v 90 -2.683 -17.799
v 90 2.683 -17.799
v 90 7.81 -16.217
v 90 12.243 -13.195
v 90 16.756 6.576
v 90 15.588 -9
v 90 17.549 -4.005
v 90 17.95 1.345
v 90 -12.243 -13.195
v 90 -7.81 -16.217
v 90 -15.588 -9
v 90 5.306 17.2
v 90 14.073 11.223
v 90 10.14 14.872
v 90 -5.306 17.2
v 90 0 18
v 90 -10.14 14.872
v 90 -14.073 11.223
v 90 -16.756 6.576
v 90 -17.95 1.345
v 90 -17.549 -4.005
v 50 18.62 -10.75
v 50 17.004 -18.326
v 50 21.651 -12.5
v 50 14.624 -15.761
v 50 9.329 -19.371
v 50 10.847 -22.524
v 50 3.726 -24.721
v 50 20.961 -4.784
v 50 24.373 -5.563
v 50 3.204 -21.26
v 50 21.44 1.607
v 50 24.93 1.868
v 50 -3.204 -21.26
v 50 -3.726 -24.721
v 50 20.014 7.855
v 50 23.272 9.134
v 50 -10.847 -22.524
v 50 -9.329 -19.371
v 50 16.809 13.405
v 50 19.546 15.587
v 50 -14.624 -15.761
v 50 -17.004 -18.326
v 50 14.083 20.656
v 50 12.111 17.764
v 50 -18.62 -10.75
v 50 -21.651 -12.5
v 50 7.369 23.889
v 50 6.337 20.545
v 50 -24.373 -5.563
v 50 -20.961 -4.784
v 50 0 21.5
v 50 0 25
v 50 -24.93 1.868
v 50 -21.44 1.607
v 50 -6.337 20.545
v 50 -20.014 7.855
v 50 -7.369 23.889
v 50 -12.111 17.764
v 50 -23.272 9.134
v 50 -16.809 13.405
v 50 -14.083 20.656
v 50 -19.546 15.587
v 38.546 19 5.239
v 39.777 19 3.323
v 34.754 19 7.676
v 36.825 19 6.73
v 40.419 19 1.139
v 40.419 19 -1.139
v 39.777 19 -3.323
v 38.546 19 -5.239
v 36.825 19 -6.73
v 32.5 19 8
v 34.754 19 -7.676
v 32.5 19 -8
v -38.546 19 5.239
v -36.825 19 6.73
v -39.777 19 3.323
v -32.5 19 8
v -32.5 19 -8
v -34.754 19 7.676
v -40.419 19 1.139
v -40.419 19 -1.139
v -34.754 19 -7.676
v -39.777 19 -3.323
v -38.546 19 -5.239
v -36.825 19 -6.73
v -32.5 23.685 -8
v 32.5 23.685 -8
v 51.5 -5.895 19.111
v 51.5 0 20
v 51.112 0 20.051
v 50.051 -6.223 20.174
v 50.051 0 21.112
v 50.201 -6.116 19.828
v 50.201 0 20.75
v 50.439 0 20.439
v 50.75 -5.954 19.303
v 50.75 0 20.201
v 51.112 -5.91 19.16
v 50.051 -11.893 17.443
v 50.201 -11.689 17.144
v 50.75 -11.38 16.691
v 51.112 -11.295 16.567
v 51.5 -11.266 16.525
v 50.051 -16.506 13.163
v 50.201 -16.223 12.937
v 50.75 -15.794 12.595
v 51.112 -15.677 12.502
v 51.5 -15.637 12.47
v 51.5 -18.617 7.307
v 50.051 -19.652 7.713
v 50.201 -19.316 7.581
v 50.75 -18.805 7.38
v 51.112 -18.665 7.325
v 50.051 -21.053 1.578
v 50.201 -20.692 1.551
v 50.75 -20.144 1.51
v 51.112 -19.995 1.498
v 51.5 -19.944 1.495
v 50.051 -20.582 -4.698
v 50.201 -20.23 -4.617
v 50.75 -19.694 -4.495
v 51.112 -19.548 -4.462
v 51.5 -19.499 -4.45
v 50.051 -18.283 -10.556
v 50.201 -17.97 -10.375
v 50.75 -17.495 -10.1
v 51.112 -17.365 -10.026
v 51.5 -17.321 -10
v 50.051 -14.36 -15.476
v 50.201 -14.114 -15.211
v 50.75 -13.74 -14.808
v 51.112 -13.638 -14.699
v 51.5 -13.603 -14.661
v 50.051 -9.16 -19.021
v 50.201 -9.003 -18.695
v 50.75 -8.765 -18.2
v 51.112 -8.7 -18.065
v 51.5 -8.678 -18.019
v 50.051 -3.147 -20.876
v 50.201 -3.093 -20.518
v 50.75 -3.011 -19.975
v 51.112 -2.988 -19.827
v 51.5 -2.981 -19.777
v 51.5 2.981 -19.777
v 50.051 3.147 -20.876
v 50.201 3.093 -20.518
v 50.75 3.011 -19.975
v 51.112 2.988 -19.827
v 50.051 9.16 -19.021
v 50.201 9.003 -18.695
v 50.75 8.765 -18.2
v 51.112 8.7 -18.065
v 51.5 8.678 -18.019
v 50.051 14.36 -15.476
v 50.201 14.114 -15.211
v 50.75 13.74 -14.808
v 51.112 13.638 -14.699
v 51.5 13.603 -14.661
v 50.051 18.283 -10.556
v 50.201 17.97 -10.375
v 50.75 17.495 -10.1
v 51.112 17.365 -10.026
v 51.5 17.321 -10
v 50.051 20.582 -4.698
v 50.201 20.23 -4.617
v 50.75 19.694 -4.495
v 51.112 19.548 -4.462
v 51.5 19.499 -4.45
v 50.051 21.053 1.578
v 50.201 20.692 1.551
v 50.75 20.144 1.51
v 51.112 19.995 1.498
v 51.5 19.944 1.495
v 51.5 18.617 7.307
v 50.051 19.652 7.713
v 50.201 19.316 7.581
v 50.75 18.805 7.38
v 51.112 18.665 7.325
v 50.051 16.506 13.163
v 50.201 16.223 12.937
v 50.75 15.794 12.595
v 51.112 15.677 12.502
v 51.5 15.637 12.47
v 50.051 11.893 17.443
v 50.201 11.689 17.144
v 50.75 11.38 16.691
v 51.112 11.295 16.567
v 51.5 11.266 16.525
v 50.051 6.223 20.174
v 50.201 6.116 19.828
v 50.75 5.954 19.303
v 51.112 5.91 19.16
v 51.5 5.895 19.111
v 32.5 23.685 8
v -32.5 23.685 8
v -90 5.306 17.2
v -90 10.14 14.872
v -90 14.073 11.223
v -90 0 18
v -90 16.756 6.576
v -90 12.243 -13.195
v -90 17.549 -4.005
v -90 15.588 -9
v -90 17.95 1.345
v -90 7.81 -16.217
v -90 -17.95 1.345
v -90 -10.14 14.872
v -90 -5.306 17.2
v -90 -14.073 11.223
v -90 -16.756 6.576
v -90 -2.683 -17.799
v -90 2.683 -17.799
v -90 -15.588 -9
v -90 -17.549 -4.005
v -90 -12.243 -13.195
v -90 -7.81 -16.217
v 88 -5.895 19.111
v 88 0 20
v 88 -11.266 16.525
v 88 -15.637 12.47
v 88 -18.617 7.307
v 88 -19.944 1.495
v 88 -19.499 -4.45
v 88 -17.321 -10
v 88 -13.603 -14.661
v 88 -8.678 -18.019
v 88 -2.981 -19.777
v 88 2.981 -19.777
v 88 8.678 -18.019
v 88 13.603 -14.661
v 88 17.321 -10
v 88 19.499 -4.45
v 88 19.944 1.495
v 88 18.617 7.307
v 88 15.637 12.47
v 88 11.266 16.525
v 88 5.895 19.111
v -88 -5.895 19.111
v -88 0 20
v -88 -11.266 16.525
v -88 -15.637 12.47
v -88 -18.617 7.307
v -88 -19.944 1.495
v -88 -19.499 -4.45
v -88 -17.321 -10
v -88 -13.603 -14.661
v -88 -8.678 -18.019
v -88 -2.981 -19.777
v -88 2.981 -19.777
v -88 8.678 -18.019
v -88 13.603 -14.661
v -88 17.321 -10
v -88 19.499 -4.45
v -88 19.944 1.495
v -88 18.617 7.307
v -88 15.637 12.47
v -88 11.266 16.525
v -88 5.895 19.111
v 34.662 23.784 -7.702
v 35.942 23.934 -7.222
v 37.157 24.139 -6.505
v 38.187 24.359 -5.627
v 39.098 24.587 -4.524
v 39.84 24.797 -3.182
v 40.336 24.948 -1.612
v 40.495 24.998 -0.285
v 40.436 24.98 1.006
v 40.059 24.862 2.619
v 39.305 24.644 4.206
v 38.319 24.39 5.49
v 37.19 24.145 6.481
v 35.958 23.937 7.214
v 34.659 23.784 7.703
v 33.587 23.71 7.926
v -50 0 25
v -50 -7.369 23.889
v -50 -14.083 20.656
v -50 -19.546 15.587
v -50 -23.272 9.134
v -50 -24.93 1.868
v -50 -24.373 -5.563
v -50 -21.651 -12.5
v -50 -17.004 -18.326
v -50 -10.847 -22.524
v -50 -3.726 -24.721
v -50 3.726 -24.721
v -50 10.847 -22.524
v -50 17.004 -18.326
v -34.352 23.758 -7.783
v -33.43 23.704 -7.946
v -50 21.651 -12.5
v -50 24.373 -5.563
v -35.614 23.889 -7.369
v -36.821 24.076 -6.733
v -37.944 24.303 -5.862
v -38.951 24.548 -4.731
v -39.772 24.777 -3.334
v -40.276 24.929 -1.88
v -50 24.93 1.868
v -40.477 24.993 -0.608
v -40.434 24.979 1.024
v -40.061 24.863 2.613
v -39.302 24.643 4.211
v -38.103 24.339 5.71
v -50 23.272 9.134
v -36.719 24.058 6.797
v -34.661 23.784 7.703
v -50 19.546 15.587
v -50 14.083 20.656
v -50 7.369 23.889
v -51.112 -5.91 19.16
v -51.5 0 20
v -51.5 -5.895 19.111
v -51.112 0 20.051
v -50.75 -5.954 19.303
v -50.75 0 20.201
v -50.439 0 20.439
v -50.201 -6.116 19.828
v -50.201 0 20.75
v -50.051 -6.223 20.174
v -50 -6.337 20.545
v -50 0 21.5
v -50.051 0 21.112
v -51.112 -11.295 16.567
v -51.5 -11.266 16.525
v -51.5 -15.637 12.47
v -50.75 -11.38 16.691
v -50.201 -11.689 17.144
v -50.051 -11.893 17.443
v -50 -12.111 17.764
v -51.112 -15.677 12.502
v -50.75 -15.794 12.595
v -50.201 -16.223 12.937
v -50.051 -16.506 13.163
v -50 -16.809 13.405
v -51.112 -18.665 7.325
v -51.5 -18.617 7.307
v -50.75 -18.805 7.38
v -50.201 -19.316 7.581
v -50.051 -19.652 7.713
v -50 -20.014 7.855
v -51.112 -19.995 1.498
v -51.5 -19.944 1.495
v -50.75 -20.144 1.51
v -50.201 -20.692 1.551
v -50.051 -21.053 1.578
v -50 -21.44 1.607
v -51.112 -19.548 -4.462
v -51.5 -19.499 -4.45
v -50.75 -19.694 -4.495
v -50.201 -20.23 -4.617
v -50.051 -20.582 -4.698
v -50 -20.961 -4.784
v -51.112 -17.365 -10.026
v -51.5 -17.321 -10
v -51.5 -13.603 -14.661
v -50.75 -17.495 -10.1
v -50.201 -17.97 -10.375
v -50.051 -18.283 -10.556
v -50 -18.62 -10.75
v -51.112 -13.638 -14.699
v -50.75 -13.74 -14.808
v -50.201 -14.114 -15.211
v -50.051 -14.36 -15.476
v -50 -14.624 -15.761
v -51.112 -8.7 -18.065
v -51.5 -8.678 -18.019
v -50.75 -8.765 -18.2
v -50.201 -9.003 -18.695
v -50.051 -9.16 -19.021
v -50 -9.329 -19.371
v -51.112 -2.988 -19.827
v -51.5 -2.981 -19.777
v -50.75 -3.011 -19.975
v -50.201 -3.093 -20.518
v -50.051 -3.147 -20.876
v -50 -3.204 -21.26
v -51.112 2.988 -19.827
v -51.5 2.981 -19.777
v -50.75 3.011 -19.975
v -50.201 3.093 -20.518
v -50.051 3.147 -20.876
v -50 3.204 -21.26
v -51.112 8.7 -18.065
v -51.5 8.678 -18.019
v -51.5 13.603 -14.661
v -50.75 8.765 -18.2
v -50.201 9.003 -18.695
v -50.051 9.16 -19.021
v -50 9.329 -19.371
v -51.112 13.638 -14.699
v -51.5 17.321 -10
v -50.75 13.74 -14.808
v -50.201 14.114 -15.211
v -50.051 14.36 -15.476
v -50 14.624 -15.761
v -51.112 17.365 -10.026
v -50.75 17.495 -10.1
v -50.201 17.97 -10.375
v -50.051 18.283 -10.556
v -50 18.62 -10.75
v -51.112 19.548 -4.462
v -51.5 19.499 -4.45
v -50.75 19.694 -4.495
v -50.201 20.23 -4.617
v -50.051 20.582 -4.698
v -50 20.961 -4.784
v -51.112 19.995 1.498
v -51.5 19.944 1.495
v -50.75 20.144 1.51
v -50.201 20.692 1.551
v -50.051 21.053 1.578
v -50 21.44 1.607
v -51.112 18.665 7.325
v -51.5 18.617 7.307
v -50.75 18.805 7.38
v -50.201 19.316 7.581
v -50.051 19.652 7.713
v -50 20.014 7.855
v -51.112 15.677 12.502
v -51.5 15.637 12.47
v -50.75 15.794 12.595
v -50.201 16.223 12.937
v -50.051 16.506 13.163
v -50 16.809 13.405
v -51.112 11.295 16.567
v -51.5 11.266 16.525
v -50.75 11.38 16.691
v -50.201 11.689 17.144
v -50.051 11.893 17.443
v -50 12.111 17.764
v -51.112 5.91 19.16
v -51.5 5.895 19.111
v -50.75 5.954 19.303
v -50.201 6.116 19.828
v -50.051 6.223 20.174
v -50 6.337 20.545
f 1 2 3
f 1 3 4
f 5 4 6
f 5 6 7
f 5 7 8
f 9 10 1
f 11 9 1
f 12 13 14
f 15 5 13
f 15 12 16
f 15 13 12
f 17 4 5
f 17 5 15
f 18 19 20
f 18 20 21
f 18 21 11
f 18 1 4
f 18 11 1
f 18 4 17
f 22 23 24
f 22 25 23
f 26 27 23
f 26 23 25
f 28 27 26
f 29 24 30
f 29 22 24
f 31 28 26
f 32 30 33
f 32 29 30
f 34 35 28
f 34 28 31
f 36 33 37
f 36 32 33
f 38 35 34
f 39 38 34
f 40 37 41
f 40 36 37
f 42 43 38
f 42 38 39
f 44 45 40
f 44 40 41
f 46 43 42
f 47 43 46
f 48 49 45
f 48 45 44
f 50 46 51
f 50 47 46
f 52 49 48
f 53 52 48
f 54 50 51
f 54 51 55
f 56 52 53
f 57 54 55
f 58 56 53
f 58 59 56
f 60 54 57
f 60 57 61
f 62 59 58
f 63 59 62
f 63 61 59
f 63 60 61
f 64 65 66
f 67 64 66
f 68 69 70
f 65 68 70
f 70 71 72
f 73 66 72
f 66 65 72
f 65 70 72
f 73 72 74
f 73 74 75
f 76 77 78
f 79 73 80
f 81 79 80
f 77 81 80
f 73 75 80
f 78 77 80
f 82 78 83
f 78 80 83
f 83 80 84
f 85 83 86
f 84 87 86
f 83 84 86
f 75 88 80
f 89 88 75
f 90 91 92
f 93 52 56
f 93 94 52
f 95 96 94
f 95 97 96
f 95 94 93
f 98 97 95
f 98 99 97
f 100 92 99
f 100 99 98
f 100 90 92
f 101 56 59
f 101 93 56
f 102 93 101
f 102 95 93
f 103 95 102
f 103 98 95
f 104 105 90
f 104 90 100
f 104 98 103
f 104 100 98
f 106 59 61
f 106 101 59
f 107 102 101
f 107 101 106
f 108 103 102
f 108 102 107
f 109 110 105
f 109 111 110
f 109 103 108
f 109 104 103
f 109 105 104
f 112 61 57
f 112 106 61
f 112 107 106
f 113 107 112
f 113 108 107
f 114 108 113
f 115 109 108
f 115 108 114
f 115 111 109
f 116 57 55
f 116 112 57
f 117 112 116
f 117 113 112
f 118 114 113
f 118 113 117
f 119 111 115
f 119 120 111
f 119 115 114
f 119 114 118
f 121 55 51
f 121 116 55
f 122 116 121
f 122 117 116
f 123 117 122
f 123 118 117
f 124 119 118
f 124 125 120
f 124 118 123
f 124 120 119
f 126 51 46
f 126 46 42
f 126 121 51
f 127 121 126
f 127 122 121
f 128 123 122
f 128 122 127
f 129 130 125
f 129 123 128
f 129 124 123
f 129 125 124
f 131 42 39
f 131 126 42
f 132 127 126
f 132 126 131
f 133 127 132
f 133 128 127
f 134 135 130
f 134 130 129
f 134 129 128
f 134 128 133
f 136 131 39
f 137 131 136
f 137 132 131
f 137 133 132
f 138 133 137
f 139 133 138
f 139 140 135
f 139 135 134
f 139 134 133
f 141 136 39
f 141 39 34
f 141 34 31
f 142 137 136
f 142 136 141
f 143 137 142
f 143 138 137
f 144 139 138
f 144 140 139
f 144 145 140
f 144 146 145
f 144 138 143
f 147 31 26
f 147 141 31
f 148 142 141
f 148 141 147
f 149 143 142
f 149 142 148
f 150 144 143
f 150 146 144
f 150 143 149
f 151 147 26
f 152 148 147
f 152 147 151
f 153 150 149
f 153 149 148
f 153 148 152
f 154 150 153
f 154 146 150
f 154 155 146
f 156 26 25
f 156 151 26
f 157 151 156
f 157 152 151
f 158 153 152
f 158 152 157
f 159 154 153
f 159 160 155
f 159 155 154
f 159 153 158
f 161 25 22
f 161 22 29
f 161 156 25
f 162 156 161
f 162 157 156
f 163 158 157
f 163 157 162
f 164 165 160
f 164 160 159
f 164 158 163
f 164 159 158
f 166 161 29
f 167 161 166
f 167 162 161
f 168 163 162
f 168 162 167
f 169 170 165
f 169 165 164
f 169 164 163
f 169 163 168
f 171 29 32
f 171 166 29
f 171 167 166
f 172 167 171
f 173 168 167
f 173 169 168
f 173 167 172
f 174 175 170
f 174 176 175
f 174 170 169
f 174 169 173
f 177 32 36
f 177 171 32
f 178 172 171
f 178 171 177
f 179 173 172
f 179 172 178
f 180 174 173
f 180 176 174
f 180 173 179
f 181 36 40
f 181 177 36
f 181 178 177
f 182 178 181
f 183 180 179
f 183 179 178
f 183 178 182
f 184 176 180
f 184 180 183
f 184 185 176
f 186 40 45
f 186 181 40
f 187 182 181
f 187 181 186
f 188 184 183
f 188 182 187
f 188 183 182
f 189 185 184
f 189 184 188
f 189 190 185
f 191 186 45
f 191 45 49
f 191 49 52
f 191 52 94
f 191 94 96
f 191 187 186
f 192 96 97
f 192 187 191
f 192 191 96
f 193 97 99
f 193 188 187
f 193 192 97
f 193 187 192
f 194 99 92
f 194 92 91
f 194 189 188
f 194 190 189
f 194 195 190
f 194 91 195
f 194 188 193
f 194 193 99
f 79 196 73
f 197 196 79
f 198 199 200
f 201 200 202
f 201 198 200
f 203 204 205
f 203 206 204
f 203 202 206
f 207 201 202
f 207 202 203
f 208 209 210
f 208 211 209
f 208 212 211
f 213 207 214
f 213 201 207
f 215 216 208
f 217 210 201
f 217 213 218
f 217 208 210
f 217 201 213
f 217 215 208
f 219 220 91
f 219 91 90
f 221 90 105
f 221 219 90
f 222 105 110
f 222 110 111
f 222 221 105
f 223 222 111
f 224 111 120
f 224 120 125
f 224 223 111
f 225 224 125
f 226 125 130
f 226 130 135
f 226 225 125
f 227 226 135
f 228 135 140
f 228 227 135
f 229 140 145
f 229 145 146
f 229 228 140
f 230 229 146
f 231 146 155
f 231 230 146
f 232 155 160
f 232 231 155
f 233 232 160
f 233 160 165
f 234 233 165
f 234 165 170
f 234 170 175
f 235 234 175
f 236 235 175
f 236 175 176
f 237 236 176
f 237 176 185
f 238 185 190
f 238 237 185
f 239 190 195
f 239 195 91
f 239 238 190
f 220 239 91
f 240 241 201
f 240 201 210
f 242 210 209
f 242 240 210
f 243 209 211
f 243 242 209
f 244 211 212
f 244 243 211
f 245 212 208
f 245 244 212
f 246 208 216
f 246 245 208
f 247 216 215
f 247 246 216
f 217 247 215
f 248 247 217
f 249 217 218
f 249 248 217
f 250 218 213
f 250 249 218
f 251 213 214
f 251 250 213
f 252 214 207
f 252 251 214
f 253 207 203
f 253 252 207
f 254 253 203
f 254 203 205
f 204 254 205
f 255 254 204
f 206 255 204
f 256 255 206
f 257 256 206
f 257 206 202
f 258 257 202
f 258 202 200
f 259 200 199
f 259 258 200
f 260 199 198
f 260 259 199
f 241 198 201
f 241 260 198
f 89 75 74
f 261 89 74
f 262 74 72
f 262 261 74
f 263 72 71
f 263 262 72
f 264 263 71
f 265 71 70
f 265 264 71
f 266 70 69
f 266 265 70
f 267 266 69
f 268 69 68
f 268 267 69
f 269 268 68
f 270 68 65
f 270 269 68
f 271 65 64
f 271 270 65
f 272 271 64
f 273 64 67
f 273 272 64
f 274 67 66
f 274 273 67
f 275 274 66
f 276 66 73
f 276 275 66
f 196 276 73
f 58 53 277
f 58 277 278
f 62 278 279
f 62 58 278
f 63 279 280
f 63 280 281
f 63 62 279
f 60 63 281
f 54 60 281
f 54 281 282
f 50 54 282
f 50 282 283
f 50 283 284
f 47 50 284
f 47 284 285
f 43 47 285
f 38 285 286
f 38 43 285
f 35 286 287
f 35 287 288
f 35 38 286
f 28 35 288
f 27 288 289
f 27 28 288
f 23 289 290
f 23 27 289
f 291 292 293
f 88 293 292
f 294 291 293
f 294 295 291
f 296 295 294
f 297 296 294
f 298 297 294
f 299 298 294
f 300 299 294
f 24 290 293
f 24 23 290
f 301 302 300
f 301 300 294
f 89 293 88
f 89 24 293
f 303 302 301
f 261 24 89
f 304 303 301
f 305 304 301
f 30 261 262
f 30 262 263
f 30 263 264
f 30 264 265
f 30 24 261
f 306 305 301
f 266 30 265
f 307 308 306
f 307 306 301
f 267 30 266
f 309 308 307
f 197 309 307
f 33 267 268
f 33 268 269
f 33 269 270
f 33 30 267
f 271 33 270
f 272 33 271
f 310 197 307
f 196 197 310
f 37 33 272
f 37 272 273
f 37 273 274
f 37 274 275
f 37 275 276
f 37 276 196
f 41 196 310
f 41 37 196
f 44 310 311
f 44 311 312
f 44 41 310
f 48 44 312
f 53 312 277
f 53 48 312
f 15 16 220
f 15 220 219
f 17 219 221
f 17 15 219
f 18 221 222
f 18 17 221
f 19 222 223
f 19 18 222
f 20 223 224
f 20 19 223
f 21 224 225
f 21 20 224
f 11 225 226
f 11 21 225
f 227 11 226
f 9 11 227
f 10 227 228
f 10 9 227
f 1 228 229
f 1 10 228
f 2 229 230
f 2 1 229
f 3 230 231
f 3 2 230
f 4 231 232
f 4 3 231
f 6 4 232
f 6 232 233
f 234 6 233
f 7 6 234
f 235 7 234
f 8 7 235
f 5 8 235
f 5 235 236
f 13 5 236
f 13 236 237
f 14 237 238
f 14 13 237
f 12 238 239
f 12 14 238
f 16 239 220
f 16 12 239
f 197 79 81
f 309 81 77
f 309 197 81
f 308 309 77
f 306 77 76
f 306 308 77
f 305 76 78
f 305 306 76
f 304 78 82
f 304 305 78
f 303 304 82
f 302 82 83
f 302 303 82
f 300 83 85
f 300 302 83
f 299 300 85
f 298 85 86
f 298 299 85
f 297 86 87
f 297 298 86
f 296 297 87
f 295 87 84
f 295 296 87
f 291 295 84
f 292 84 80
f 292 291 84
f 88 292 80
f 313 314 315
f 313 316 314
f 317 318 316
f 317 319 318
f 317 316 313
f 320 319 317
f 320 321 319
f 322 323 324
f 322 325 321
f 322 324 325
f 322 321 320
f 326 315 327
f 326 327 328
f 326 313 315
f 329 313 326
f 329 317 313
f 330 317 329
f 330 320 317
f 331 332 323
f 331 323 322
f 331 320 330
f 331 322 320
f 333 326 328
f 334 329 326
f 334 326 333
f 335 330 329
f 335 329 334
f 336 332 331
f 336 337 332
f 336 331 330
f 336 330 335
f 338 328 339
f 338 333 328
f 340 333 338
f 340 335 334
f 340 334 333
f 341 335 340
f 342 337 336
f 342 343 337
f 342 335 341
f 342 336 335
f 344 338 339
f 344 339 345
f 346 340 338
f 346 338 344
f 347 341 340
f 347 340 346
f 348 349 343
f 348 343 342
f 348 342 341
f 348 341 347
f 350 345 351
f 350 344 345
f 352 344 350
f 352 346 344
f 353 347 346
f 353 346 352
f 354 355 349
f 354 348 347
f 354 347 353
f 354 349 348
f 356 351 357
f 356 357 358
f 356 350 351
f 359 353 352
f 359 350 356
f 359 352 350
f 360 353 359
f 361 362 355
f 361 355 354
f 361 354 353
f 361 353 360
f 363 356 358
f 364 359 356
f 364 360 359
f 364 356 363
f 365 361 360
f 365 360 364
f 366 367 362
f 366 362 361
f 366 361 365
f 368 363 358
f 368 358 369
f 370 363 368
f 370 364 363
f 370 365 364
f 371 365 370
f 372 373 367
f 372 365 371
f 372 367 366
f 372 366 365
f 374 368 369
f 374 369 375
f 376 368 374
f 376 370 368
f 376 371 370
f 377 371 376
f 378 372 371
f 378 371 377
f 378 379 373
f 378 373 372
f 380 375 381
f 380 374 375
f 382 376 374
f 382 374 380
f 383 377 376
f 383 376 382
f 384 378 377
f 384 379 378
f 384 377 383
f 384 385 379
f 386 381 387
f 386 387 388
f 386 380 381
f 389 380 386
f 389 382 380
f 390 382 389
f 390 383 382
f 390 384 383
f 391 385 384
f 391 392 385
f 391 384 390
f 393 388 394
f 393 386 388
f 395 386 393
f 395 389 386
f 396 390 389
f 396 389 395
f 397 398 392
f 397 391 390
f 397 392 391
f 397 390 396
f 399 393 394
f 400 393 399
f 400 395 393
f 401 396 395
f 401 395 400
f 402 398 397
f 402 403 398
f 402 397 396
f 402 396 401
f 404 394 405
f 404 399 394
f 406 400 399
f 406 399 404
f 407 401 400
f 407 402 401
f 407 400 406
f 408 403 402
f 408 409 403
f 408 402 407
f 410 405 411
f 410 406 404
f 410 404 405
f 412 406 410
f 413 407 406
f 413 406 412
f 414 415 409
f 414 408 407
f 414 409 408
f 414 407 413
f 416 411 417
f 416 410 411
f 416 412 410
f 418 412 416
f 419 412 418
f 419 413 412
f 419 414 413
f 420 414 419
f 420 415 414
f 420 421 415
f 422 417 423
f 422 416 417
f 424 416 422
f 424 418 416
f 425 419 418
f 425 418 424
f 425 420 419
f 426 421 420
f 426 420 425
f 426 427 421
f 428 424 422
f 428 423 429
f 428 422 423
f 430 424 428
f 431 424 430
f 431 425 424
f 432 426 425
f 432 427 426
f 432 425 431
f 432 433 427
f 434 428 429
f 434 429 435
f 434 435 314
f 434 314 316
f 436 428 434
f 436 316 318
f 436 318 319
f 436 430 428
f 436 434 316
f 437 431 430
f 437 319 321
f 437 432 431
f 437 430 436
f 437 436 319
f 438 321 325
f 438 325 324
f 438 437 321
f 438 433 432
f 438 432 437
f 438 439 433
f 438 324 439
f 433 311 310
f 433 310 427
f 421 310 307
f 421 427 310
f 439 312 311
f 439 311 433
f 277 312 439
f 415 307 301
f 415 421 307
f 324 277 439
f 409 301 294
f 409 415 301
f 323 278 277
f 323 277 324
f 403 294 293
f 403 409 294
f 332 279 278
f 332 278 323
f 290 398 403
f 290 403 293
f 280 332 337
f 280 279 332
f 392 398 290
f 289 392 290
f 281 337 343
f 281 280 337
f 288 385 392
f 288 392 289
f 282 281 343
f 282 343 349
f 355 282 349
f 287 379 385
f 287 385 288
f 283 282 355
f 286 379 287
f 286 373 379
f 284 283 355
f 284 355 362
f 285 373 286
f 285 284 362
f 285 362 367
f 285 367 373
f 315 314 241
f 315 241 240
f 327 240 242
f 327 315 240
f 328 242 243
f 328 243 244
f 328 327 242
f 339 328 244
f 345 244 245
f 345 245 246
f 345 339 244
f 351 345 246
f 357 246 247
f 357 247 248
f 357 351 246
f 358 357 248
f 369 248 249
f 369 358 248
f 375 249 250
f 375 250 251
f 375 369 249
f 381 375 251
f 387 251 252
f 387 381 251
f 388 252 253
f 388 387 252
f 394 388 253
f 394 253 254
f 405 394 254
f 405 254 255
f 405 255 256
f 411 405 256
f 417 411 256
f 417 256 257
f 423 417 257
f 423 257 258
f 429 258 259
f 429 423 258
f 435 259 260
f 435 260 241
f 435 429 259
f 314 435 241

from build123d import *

# Parameters (mm, degrees)
CHANFREIN1_SIZE         = 2
ENL_V_MAT_EXTRU_1_DEPTH = 6


with BuildPart() as part:
    # Esquisse1 → Révolution1 (revolve)
    with BuildSketch(Plane(origin=(0, 0, 0), x_dir=(1, 0, 0), z_dir=(0, 1, 0)), mode=Mode.PRIVATE) as r_volution1_sk:
        with BuildLine():
            Line((-90, 0), (-90, 20))
            Line((-90, 20), (-51.5, 20))
            ThreePointArc((-51.5, 20), (-50.439339828, 20.439339828), (-50, 21.5))
            Line((-50, 21.5), (-50, 25))
            Line((-50, 25), (50, 25))
            Line((50, 25), (50, 21.5))
            ThreePointArc((50, 21.5), (50.439339828, 20.439339828), (51.5, 20))
            Line((51.5, 20), (90, 20))
            Line((90, 20), (90, 0))
            Line((90, 0), (-90, 0))
        make_face()
    revolve(r_volution1_sk.sketch.rotate(Axis((-90, 0, 0), (1, 0, 0)), 180), axis=Axis((-90, 0, 0), (1, 0, 0)))

    # Chanfrein1
    chanfrein1_edges = [part.edges().sort_by_distance(p)[0] for p in [
        (-90, 0, -20),
        (90, 0, -20),
    ]]
    chamfer(chanfrein1_edges, length=CHANFREIN1_SIZE)

    # Esquisse2 → Enlèv. mat.-Extru.1 (cut)
    with BuildSketch(Plane(origin=(0, 25, 0), x_dir=(1, 0, 0), z_dir=(0, 1, 0))):
        with BuildLine():
            Line((-32.5, 8), (32.5, 8))
            ThreePointArc((32.5, 8), (40.5, 0), (32.5, -8))
            Line((32.5, -8), (-32.5, -8))
            ThreePointArc((-32.5, -8), (-40.5, 0), (-32.5, 8))
        make_face()
    extrude(amount=-ENL_V_MAT_EXTRU_1_DEPTH, mode=Mode.SUBTRACT)


solid = part.part
